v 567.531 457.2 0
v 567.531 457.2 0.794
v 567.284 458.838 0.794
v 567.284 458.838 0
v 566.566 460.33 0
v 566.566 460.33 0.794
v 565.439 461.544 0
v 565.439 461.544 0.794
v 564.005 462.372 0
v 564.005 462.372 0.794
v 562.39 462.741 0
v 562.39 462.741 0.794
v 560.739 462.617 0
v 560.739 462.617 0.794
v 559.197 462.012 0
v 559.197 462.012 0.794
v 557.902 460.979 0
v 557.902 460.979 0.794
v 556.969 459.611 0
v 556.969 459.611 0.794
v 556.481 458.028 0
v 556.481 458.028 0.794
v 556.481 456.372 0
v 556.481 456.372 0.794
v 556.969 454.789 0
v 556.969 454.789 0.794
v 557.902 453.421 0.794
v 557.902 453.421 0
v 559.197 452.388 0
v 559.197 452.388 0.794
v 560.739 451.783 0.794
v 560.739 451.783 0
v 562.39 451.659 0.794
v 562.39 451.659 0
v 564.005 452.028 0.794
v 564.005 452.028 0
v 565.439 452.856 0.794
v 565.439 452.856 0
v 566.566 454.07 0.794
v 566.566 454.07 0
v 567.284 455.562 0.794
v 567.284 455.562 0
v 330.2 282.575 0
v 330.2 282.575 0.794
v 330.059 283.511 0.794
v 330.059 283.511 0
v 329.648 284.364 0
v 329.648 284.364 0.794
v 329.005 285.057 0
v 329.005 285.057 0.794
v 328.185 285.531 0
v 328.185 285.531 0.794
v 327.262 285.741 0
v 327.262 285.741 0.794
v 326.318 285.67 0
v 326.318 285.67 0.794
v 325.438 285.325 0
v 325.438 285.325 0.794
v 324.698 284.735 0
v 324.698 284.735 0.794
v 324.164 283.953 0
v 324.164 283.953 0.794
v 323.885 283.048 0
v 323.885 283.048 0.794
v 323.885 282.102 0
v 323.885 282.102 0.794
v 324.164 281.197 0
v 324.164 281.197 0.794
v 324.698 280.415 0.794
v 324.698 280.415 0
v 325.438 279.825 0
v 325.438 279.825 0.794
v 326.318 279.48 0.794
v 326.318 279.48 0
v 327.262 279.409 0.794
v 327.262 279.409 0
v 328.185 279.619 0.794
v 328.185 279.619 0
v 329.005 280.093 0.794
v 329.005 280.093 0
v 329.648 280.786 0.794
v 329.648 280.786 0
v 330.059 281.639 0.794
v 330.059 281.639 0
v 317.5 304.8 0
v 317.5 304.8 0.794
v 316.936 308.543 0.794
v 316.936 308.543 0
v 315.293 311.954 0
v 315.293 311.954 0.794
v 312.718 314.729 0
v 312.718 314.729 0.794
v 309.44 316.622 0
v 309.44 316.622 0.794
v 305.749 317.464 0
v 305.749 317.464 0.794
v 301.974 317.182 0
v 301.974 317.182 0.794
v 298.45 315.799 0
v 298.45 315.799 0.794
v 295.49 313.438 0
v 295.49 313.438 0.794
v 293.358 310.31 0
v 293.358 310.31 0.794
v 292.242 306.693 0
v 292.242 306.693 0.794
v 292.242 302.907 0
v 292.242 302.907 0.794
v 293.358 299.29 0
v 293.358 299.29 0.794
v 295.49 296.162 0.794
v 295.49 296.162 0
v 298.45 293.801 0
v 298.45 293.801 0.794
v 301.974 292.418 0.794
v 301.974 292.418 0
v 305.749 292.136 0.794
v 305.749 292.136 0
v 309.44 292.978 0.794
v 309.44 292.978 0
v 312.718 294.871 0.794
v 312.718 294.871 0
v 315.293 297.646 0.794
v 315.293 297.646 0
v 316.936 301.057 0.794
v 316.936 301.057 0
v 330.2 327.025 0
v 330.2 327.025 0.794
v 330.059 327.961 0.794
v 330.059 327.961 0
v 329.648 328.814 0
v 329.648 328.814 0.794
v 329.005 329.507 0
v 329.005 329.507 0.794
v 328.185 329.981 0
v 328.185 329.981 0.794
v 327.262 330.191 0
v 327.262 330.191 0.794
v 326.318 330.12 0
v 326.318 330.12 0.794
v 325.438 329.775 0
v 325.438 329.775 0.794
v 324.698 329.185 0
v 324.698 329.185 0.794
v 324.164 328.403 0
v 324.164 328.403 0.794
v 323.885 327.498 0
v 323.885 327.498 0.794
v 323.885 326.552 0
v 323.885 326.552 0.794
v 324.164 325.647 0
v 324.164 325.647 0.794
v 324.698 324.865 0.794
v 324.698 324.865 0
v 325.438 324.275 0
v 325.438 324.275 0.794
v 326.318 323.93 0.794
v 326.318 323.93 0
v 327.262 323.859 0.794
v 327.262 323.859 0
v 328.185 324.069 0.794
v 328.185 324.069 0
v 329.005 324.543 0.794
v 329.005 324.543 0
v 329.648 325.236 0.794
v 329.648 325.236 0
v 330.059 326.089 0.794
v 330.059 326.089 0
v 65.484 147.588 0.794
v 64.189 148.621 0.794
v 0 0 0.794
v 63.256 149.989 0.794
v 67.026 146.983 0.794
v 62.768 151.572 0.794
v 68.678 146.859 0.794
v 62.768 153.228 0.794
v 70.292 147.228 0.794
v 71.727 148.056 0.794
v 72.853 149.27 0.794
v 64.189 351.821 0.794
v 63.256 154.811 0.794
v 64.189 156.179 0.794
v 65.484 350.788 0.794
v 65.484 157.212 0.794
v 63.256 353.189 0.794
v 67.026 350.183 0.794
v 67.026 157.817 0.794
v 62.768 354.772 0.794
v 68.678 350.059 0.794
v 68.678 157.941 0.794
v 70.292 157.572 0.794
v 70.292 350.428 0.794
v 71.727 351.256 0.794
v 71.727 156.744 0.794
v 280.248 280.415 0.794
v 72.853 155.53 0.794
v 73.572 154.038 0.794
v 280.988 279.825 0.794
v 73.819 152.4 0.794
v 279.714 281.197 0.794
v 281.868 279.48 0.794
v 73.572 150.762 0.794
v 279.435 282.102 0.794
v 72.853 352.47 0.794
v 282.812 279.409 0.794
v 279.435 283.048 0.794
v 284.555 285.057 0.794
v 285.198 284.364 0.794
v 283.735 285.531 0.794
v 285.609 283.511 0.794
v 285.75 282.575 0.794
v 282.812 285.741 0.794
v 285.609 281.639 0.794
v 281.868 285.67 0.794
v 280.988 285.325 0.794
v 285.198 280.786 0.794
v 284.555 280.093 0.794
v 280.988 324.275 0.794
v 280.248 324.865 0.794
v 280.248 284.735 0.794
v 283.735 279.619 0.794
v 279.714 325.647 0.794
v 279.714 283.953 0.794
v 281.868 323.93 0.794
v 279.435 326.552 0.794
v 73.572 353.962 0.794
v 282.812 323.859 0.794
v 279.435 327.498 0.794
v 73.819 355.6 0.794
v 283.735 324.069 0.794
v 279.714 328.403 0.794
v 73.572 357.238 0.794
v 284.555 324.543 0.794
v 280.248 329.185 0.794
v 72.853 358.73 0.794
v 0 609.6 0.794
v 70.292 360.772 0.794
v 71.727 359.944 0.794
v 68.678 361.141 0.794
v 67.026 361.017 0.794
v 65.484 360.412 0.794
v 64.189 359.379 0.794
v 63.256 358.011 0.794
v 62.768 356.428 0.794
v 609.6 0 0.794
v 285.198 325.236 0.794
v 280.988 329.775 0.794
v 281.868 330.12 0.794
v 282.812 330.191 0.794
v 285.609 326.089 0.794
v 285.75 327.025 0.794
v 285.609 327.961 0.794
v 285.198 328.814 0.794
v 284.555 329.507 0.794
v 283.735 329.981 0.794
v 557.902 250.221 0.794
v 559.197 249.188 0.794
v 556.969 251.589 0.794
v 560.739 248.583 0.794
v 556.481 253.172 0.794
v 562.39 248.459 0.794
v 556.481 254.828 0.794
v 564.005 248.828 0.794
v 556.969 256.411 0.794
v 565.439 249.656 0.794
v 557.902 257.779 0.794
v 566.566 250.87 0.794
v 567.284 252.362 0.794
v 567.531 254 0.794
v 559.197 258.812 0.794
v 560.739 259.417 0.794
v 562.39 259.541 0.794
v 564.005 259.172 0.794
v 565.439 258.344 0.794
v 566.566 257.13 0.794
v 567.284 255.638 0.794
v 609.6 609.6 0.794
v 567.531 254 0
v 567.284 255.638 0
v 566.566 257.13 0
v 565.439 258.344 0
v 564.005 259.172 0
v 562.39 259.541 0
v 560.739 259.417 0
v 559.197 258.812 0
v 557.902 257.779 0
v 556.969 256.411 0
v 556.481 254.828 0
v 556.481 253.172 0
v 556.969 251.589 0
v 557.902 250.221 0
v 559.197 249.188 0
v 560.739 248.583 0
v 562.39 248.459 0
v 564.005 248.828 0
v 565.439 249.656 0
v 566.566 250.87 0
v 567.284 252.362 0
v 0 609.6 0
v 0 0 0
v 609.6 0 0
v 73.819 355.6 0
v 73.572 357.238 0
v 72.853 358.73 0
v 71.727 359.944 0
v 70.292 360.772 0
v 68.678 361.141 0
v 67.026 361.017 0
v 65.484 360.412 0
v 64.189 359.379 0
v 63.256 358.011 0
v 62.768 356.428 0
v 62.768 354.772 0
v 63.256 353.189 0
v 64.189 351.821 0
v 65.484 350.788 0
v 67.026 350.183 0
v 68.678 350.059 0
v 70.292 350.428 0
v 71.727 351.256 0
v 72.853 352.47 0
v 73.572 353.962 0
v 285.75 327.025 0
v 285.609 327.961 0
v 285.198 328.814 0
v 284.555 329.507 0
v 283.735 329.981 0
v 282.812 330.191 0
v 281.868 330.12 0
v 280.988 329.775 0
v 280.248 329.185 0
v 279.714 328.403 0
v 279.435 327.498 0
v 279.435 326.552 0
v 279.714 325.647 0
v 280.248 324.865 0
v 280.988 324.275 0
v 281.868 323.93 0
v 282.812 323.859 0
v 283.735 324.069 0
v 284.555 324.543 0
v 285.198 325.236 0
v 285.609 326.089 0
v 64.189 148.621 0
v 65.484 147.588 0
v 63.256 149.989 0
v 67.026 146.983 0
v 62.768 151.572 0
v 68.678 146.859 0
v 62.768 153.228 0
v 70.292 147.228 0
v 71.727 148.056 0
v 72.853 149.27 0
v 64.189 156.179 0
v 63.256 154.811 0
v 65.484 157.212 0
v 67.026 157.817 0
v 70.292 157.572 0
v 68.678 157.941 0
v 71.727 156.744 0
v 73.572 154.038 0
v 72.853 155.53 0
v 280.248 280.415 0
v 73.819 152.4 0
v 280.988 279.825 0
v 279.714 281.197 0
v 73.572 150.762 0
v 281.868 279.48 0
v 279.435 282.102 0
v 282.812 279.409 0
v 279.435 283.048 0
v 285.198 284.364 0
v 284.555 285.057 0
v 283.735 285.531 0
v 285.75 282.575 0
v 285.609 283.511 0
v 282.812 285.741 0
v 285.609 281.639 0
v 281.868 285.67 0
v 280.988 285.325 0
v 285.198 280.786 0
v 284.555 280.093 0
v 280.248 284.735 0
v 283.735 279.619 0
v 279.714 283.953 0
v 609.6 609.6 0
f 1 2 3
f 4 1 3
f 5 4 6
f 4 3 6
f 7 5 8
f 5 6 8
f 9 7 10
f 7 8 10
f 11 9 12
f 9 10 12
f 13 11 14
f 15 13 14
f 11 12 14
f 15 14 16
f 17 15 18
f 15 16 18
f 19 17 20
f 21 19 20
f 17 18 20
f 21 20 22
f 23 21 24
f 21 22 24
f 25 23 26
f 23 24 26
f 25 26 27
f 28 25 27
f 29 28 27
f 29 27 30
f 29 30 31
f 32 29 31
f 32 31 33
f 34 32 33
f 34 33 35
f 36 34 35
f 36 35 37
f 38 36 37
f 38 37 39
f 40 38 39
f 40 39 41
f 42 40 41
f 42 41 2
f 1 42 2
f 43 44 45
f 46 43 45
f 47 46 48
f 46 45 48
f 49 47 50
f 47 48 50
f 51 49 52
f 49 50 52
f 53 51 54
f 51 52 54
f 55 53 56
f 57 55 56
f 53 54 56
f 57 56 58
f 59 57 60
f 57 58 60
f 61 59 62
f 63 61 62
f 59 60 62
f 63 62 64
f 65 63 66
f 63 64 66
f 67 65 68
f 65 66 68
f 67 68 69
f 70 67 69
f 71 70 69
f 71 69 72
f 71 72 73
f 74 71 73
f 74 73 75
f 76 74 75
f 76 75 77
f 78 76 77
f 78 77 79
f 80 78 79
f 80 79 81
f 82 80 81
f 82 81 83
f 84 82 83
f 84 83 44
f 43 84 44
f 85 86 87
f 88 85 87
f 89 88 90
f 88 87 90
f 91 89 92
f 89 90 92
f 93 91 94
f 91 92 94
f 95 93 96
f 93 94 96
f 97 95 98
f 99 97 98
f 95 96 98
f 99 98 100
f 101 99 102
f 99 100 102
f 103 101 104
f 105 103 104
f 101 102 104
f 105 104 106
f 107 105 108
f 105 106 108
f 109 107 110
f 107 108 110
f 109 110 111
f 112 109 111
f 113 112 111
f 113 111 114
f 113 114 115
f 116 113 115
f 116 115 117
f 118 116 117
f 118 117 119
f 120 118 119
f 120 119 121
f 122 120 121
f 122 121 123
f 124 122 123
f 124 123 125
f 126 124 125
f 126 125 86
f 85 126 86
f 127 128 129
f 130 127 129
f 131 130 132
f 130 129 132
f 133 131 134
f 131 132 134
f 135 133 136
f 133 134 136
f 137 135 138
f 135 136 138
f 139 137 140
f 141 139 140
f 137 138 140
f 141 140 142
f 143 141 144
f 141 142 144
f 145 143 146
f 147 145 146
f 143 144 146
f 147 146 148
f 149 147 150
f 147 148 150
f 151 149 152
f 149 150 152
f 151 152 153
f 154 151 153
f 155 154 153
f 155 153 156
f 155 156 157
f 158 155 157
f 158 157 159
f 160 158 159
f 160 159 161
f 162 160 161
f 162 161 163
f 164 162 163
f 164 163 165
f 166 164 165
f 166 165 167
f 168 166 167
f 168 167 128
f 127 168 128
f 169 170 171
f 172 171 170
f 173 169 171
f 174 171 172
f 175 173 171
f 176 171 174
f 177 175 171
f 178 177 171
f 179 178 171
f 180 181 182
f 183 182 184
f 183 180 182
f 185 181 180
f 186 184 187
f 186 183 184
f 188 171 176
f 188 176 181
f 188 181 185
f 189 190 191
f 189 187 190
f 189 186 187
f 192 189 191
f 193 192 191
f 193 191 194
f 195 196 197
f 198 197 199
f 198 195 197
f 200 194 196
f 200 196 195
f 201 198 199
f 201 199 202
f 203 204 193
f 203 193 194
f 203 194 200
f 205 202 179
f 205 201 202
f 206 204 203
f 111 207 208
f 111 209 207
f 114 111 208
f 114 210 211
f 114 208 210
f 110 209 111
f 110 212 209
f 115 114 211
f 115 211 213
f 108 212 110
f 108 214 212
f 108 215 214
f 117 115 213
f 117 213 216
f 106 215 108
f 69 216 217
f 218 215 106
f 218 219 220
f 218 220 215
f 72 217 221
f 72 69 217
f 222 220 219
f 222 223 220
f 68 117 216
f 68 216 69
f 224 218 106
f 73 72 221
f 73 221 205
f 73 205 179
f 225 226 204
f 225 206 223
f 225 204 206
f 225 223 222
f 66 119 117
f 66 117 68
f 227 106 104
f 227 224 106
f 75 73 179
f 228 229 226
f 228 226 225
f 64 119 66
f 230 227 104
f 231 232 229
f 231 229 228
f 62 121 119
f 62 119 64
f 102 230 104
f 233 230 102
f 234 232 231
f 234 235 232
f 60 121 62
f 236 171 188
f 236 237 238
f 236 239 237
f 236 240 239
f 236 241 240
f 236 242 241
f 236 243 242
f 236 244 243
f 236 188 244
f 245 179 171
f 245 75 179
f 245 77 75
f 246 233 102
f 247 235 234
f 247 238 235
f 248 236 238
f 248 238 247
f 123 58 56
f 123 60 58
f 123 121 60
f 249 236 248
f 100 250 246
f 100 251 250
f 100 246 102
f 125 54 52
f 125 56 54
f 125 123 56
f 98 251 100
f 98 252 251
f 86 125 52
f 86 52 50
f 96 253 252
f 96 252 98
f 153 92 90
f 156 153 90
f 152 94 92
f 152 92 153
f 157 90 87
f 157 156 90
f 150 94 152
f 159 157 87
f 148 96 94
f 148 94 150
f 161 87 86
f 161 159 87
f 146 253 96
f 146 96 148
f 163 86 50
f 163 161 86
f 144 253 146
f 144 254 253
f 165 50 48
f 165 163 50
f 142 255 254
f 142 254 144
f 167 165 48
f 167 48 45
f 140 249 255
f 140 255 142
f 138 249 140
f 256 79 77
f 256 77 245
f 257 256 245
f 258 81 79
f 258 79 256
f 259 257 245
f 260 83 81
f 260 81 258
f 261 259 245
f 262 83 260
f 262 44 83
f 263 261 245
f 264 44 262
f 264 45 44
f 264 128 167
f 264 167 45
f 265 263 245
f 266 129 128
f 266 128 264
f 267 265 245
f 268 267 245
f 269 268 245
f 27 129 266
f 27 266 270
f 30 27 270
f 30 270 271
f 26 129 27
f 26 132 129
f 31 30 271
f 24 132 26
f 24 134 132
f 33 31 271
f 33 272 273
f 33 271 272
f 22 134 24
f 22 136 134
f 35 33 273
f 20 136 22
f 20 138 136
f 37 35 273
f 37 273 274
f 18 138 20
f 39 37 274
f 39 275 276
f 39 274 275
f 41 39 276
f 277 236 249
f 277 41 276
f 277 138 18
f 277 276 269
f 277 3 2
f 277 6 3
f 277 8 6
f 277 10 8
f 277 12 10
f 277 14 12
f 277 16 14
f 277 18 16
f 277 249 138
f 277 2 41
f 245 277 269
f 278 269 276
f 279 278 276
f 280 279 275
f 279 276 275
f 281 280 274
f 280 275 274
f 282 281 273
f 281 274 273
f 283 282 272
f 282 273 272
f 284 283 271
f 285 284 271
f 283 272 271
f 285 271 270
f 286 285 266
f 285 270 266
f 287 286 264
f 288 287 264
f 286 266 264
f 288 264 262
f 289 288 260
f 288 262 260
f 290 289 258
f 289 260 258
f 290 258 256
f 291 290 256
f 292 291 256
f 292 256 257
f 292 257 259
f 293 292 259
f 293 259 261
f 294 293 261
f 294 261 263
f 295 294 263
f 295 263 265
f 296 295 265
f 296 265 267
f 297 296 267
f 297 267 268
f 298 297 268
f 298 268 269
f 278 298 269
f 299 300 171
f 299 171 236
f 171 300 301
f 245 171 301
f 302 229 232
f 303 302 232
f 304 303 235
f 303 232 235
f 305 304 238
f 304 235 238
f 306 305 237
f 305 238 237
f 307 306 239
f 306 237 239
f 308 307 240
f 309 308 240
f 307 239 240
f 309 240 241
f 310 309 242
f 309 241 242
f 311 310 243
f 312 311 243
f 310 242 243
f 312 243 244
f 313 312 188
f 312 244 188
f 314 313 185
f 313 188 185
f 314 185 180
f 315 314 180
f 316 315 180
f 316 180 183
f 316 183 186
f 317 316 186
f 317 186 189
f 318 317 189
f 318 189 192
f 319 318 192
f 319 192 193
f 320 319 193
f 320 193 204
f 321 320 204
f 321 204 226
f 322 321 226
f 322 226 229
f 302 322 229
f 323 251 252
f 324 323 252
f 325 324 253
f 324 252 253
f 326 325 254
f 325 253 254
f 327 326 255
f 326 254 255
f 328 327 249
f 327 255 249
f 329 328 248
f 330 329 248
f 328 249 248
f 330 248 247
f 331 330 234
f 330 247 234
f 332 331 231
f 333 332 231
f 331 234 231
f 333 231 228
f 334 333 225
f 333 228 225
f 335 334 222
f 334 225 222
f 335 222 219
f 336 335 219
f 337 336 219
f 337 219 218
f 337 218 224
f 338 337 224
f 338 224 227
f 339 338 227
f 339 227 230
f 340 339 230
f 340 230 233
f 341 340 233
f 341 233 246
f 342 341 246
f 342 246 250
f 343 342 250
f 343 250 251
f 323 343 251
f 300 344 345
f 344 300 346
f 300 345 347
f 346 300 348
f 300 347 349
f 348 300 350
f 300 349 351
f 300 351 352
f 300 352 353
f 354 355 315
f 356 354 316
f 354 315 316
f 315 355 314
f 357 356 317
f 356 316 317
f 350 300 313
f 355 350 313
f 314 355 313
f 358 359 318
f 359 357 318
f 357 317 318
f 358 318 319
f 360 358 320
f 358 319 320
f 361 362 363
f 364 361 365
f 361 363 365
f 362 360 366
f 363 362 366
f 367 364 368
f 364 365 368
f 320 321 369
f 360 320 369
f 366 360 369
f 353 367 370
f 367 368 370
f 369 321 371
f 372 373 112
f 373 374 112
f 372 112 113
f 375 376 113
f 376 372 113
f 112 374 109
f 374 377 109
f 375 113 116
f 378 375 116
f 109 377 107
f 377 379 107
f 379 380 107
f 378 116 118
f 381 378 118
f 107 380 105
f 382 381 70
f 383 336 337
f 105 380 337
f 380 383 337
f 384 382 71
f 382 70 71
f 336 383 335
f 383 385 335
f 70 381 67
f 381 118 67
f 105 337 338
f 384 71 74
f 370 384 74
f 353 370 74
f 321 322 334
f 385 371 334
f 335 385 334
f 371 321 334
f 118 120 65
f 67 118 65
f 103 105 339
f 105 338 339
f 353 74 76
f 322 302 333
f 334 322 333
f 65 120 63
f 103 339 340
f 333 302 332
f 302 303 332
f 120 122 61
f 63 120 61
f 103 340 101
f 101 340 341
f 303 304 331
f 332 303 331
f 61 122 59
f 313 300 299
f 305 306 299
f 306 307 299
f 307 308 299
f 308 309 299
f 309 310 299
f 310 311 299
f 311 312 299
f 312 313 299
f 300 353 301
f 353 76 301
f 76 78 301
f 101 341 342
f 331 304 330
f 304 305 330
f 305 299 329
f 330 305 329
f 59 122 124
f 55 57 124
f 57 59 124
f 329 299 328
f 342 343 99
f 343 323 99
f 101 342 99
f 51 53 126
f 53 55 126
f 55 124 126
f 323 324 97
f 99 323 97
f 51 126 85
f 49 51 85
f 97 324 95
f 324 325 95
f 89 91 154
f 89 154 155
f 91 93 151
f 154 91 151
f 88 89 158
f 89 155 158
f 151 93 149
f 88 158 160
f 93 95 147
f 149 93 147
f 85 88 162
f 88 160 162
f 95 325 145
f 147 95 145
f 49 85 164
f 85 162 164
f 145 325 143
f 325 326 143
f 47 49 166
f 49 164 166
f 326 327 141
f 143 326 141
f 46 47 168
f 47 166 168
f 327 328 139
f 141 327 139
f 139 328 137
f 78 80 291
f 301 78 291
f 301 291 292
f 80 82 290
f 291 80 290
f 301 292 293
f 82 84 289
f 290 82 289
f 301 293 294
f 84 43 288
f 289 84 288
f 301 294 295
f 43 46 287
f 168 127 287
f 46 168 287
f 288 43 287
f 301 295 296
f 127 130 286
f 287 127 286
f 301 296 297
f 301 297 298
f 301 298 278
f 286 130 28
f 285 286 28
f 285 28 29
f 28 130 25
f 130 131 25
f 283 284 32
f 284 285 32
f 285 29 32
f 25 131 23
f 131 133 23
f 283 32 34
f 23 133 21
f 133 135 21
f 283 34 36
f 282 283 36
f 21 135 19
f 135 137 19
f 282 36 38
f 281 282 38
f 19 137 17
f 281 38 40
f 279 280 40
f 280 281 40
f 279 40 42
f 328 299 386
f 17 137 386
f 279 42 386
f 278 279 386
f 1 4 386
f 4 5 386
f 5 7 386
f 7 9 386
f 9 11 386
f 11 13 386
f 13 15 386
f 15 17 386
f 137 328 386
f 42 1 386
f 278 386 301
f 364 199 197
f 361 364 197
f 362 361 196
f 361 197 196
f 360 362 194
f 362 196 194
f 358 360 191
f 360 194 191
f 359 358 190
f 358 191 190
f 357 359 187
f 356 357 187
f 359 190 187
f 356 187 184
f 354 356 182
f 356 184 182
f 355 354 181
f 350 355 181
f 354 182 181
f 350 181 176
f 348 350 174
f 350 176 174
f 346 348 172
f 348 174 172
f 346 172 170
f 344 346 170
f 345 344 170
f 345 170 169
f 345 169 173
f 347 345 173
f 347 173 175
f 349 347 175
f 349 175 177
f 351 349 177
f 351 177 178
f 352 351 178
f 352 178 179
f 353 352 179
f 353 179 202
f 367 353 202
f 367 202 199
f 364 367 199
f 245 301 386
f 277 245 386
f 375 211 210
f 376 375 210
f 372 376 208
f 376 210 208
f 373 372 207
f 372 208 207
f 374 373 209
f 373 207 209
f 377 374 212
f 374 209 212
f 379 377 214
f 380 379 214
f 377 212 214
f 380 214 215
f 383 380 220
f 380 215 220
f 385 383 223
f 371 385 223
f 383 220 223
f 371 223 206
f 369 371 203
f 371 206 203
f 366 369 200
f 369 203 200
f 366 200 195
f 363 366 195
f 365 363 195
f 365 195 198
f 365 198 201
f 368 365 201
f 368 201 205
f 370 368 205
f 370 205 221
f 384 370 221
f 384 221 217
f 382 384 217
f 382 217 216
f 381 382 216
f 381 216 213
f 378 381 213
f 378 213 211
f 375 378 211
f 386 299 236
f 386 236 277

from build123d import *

# Parameters (mm, degrees)
F0_W     = 609.6
F0_H     = 609.6
F1_DEPTH = 0.79375
F2_R     = 5.55625
F3_DEPTH = 25.4
F4_R     = 12.7
F4_R_2   = 3.175
F5_DEPTH = 25.4


with BuildPart() as f1:
    # F0 (on Top) → F1 (new body)
    with BuildSketch(Plane.XY):
        with Locations((304.8, 304.8)):
            Rectangle(F0_W, F0_H)
    extrude(amount=F1_DEPTH)

    # F2 (on face) → F3 (cut)
    with BuildSketch(Plane.XY.offset(0.79375)):
        with Locations((68.2625, 152.4)):
            Circle(F2_R)
        with Locations((68.2625, 355.6)):
            Circle(F2_R)
        with Locations((561.975, 254)):
            Circle(F2_R)
        with Locations((561.975, 457.2)):
            Circle(F2_R)
    extrude(amount=-F3_DEPTH, mode=Mode.SUBTRACT)

    # F4 (on face) → F5 (cut)
    with BuildSketch(Plane.XY.offset(0.79375)):
        with Locations((304.8, 304.8)):
            Circle(F4_R)
        with Locations((282.575, 327.025)):
            Circle(F4_R_2)
        with Locations((327.025, 327.025)):
            Circle(F4_R_2)
        with Locations((327.025, 282.575)):
            Circle(F4_R_2)
        with Locations((282.575, 282.575)):
            Circle(F4_R_2)
    extrude(amount=-F5_DEPTH, mode=Mode.SUBTRACT)


solid = f1.part
